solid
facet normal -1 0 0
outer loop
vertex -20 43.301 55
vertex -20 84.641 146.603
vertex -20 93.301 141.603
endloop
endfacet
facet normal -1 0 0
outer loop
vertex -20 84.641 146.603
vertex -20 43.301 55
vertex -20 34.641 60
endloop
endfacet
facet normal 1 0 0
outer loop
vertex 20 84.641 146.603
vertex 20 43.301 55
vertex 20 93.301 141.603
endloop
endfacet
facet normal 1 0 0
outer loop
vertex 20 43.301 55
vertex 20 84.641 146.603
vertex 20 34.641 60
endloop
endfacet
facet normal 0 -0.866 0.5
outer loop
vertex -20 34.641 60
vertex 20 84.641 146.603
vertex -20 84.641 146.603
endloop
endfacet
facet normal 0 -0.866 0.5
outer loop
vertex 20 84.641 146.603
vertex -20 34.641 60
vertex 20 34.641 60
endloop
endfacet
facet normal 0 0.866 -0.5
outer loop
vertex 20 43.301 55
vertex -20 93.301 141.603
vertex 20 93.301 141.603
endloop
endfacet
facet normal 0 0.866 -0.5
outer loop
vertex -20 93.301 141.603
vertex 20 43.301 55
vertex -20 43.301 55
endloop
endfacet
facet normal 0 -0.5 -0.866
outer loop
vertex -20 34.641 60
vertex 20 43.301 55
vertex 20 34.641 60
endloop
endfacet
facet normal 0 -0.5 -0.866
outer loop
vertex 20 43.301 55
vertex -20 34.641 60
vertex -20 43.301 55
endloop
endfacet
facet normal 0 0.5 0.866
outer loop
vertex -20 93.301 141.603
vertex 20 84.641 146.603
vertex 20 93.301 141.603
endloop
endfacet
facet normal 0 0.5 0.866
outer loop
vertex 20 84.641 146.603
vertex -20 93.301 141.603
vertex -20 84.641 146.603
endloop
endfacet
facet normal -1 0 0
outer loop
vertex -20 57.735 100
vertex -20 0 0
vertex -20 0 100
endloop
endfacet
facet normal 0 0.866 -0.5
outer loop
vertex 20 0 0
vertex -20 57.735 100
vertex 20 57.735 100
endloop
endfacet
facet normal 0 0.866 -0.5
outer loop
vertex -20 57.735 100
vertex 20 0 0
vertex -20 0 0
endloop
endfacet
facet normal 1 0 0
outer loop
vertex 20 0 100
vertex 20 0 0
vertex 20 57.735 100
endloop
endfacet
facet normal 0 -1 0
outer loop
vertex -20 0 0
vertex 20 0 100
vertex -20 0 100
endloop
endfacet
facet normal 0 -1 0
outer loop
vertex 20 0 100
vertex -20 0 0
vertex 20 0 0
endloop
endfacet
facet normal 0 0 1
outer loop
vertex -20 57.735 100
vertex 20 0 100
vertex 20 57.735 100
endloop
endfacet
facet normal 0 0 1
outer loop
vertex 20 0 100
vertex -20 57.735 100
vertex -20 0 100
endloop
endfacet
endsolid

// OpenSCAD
union()  {
translate([0.0,34.641016151377556,60.0])rotate([60.0,0.0,0.0])  translate([-20.0,0.0,-10.0])scale([1.0,1.0,1.0])rotate([0.0,0.0,0.0])  cube([40.0,100.0,10.0]);
translate([-20.0,0.0,100.0])scale([1.0,1.0,1.0])rotate([0.0,0.0,0.0])  rotate([90.0,90.0,90.0])  linear_extrude(height =40.0)  polygon(
points = [[0.0,0.0],[100.0,0.0],[0.0,57.735026918962575]]);
}
